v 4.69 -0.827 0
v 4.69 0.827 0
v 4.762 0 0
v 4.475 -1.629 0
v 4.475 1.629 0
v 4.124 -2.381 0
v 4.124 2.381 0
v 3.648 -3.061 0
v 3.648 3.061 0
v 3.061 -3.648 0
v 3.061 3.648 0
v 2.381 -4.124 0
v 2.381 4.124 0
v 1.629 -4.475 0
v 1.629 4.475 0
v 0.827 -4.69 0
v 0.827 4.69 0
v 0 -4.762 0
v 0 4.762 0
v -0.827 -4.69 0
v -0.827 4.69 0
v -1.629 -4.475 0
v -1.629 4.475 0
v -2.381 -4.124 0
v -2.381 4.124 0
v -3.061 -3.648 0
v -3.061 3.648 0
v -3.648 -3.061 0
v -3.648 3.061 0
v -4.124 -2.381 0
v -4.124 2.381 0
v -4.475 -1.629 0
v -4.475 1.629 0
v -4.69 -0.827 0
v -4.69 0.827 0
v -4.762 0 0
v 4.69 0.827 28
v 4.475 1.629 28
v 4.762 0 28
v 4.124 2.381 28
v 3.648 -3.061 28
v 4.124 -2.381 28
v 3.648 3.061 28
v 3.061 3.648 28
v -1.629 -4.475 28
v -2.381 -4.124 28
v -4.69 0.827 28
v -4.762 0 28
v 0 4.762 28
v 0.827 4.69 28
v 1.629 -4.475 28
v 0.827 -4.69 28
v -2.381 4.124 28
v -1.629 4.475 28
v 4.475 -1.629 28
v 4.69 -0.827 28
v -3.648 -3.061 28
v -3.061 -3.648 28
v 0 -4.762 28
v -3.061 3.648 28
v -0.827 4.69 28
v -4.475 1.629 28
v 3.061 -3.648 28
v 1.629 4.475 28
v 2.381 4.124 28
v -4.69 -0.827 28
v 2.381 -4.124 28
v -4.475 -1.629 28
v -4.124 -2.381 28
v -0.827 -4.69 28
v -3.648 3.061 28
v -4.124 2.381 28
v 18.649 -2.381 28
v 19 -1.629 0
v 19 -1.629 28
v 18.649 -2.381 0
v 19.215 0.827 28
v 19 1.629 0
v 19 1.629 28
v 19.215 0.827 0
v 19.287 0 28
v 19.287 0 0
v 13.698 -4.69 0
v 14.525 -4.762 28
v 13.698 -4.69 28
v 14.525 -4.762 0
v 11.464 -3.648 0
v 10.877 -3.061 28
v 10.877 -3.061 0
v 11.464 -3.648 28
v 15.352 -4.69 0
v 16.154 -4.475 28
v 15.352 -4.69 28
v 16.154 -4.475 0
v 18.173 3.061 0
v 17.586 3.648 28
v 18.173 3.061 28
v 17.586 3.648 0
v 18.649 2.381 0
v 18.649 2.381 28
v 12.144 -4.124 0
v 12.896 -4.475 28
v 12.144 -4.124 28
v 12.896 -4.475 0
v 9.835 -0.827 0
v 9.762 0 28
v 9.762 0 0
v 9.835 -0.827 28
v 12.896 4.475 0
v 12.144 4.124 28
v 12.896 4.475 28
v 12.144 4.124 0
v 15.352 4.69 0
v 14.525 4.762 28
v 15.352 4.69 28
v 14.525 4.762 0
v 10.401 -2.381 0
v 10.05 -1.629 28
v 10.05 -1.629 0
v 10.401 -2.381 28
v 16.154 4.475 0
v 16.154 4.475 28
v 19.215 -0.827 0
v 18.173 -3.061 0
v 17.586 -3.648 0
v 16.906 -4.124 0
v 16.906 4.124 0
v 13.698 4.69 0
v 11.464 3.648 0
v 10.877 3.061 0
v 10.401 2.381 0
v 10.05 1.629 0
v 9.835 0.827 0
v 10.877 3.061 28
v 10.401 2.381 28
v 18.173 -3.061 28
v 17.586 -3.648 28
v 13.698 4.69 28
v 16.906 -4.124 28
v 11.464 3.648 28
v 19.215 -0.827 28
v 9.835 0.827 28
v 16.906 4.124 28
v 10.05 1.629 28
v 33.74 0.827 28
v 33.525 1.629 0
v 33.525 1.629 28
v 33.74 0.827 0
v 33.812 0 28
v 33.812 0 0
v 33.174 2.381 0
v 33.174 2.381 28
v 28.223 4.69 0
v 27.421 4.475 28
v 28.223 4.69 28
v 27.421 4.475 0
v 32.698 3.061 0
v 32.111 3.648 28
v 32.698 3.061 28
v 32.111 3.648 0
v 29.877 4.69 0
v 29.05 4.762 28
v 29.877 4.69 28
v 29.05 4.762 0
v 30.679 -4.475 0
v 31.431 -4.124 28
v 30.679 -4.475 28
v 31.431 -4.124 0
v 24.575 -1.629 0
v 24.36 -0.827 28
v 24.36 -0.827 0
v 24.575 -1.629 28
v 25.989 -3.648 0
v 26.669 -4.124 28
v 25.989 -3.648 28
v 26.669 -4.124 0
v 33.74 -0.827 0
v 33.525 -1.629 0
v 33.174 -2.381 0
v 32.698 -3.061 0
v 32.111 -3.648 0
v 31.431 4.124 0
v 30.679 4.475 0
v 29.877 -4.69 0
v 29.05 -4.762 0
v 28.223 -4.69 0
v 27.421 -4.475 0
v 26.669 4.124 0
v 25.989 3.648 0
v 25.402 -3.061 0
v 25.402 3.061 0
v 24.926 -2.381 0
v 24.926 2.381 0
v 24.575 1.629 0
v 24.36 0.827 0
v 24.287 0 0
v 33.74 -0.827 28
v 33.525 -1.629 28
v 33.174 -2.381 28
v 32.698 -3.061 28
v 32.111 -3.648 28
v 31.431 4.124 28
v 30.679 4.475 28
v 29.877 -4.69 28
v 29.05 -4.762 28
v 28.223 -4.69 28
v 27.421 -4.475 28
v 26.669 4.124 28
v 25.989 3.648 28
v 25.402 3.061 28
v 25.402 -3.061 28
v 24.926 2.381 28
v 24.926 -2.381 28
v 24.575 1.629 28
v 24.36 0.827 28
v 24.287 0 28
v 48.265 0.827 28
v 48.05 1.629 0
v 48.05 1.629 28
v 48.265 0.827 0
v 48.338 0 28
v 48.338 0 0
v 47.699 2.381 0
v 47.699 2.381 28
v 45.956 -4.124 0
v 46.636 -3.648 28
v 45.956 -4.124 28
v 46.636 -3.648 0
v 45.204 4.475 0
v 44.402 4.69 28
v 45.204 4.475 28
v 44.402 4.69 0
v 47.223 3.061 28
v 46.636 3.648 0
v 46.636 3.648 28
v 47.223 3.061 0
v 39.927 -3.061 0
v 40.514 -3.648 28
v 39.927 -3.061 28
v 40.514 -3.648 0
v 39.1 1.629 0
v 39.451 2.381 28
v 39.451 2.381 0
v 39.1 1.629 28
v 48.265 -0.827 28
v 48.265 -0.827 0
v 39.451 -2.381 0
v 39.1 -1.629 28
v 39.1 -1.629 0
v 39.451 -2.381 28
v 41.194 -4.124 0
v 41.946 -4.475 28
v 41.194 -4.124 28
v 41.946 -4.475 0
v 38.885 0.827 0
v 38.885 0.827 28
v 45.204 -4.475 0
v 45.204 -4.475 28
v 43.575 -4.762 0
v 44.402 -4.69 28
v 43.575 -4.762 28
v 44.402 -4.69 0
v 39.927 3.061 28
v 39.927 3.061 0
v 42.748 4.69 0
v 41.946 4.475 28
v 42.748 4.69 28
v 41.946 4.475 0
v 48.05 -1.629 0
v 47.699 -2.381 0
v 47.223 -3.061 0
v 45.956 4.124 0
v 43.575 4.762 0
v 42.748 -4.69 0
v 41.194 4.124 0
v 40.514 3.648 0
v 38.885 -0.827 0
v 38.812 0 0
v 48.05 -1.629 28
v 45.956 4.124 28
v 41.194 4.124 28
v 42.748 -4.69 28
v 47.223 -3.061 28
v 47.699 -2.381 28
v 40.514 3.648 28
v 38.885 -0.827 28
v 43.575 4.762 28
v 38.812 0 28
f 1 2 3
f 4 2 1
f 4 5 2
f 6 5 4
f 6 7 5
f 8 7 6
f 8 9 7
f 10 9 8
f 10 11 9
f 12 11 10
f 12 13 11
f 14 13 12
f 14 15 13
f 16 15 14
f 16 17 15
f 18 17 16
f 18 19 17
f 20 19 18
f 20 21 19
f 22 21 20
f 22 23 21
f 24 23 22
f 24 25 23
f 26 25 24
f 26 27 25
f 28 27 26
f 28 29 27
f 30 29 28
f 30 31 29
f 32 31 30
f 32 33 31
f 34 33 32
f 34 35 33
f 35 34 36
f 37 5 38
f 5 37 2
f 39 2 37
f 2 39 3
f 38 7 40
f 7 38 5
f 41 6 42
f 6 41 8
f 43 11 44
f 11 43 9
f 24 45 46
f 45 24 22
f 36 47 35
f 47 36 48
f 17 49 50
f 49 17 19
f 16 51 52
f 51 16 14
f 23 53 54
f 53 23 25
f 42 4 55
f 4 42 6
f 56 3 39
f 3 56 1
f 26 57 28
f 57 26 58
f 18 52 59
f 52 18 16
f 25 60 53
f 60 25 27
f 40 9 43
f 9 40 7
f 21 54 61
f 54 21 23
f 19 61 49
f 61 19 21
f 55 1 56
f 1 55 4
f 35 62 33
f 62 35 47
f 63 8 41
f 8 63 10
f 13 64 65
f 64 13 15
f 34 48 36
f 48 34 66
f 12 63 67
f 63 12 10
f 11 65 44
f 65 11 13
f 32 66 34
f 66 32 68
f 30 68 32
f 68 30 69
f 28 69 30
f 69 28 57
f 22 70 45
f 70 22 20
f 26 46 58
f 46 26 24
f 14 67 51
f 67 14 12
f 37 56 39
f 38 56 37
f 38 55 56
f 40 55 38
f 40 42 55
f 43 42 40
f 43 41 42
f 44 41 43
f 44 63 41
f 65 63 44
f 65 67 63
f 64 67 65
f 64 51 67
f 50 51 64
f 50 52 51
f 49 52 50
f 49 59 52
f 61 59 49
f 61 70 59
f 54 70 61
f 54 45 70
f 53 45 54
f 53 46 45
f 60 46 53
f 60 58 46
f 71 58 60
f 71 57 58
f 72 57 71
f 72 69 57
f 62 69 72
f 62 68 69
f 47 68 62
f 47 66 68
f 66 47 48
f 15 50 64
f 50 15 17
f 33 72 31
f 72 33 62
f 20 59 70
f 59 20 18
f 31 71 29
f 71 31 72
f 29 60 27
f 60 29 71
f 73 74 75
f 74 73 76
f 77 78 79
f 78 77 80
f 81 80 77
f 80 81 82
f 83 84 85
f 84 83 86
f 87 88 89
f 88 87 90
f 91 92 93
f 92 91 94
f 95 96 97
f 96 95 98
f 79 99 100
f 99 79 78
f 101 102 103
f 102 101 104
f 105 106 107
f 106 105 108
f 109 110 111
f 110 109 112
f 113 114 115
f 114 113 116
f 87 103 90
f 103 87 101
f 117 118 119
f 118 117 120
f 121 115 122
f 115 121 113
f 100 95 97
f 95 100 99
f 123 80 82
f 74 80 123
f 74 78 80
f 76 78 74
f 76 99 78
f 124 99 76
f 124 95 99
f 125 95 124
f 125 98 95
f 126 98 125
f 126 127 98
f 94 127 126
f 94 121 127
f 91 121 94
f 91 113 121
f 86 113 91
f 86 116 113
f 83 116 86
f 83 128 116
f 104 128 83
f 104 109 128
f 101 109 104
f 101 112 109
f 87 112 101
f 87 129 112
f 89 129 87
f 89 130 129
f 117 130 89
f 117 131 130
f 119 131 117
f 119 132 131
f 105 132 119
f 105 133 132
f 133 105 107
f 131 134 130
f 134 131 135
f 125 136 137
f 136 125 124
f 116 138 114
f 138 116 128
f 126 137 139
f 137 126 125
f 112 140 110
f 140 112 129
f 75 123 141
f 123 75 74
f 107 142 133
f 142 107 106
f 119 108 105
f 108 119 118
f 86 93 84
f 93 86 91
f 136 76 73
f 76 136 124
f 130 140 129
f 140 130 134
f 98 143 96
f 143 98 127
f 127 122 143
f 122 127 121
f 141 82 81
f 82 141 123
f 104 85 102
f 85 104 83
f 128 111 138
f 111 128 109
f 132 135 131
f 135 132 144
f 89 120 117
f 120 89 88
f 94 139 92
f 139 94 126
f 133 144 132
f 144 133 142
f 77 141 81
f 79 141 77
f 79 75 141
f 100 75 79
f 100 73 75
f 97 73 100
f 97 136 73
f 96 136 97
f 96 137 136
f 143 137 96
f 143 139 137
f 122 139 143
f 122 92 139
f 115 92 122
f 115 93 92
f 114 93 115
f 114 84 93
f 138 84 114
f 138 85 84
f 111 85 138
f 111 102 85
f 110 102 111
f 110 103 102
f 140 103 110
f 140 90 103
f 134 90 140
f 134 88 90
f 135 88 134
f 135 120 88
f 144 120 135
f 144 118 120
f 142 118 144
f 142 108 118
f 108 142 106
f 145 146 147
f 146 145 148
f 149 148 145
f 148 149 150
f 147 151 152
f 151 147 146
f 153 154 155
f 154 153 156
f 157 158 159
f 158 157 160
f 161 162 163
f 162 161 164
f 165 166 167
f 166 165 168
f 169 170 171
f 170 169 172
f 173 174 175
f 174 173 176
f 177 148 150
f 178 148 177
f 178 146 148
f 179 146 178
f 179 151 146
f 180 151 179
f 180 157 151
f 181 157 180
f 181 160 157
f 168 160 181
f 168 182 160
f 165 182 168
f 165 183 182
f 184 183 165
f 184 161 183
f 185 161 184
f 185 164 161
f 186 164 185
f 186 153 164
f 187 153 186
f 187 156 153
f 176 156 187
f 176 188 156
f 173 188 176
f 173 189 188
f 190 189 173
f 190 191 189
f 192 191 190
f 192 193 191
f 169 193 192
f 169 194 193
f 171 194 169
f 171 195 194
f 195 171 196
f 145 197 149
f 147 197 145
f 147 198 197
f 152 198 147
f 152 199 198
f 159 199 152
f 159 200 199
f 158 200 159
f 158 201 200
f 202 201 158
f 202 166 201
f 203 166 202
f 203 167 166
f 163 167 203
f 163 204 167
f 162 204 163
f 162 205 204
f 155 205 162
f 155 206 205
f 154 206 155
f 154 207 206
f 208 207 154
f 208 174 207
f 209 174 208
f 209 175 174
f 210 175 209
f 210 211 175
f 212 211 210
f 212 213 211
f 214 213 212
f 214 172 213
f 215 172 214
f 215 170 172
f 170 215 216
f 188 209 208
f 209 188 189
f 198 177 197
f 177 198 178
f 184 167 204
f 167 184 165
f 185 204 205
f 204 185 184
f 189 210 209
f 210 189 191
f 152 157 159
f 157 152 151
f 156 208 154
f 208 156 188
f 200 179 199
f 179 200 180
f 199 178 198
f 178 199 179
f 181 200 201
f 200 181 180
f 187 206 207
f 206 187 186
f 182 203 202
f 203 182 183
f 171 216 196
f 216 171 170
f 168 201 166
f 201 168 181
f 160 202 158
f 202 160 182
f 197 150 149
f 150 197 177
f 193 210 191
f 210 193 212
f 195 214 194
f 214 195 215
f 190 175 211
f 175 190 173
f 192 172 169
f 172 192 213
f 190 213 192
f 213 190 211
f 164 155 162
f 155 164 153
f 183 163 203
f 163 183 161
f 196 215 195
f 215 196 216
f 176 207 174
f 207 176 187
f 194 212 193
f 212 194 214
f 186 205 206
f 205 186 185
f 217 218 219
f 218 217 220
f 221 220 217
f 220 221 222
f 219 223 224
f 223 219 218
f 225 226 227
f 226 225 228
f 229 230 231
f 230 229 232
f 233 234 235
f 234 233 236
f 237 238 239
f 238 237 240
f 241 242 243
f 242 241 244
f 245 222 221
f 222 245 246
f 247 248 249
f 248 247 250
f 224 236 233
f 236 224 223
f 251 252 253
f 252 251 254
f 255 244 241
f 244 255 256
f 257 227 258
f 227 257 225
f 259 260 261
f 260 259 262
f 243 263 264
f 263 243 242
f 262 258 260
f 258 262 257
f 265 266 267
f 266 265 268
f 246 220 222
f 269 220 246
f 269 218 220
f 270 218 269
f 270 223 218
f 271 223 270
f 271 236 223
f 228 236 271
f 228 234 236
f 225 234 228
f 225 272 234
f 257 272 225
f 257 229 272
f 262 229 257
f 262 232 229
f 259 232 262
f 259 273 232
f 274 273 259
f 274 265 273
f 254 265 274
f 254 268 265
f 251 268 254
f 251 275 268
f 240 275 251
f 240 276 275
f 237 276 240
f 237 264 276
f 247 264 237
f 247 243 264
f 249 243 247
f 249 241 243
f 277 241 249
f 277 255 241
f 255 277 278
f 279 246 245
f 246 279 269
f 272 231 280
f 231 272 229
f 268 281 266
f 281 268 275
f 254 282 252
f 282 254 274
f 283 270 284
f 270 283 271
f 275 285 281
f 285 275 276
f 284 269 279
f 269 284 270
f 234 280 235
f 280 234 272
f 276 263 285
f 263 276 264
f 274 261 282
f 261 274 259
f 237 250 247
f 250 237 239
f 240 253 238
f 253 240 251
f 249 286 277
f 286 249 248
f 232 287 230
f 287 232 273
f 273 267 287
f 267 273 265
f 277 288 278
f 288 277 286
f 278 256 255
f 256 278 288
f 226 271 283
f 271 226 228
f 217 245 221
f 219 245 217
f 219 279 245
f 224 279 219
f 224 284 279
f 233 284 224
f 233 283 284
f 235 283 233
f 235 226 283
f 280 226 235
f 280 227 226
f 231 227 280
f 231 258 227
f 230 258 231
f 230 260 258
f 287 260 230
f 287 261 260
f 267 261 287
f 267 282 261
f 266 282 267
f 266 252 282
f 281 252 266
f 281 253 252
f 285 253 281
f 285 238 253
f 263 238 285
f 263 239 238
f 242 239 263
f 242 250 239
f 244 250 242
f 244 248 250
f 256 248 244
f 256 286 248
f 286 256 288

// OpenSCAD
// Select which part to render: 0=full, 1/2/3=individual pieces
part = 4;

stl_path = "/Users/evansutherland/Downloads/Bambu+UniFi+G6+Turret+Camera+Soffit+Mount_stls/obj_1_Body1.stl";

// Extension: add 120mm to the long side only
ext = 120;
ext_xy = ext / sqrt(2);

// Model center
cx = 128;
cy = 128;

// Extension cut on arm axis
ext_cut_d = 100;

// Print split cuts along V axis (plain arm sections)
cut1_v = 20;
cut2_v = 170;

// 3/8" dowel pins
dowel_d = 9.525;
dowel_hole_d = dowel_d + 0.3; // holes with print tolerance
dowel_depth = 15;
dowel_length = 28; // slightly shorter than 2x depth for clearance
// Two dowels per joint, spaced across arm width, centered in height
dowel_positions = [[-13, 7.5], [13, 7.5]];

module extended_bracket() {
    union() {
        // Everything up to the extension cut
        intersection() {
            import(stl_path);
            translate([cx, cy, 0])
            rotate([0, 0, 45])
            translate([-500, -500, -1])
                cube([1000, 500 + ext_cut_d, 100]);
        }

        // Long side end piece, shifted outward
        translate([-ext_xy, ext_xy, 0])
        intersection() {
            import(stl_path);
            translate([cx, cy, 0])
            rotate([0, 0, 45])
            translate([-500, ext_cut_d, -1])
                cube([1000, 500, 100]);
        }

        // Fill gap using hull of arm cross-section
        hull() {
            intersection() {
                import(stl_path);
                translate([cx, cy, 0])
                rotate([0, 0, 45])
                translate([-500, ext_cut_d - 1, -1])
                    cube([1000, 2, 100]);
            }
            translate([-ext_xy, ext_xy, 0])
            intersection() {
                import(stl_path);
                translate([cx, cy, 0])
                rotate([0, 0, 45])
                translate([-500, ext_cut_d - 1, -1])
                    cube([1000, 2, 100]);
            }
        }
    }
}

module dowel_holes(v_pos) {
    translate([cx, cy, 0])
    rotate([0, 0, 45])
    for (pos = dowel_positions) {
        translate([pos[0], v_pos, pos[1]])
        rotate([-90, 0, 0])
        translate([0, 0, -dowel_depth])
            cylinder(d=dowel_hole_d, h=2*dowel_depth, $fn=36);
    }
}

module v_slab(v_min, v_max) {
    translate([cx, cy, 0])
    rotate([0, 0, 45])
    translate([-500, v_min, -1])
        cube([1000, v_max - v_min, 100]);
}

module piece(v_min, v_max, has_cut_min, has_cut_max) {
    difference() {
        intersection() {
            extended_bracket();
            v_slab(v_min, v_max);
        }
        if (has_cut_min) dowel_holes(v_min);
        if (has_cut_max) dowel_holes(v_max);
    }
}

if (part == 0) {
    // Full model preview (no dowel holes)
    extended_bracket();
} else if (part == 1) {
    // Short arm + circle (185mm)
    piece(-200, cut1_v, false, true);
} else if (part == 2) {
    // Middle arm section (150mm)
    piece(cut1_v, cut2_v, true, true);
} else if (part == 3) {
    // Long arm end (115mm)
    piece(cut2_v, 300, true, false);
} else if (part == 4) {
    // Dowel pins (print 4x)
    for (i = [0:3]) {
        translate([i * (dowel_d + 5), 0, 0])
            cylinder(d=dowel_d, h=dowel_length, $fn=36);
    }
}
